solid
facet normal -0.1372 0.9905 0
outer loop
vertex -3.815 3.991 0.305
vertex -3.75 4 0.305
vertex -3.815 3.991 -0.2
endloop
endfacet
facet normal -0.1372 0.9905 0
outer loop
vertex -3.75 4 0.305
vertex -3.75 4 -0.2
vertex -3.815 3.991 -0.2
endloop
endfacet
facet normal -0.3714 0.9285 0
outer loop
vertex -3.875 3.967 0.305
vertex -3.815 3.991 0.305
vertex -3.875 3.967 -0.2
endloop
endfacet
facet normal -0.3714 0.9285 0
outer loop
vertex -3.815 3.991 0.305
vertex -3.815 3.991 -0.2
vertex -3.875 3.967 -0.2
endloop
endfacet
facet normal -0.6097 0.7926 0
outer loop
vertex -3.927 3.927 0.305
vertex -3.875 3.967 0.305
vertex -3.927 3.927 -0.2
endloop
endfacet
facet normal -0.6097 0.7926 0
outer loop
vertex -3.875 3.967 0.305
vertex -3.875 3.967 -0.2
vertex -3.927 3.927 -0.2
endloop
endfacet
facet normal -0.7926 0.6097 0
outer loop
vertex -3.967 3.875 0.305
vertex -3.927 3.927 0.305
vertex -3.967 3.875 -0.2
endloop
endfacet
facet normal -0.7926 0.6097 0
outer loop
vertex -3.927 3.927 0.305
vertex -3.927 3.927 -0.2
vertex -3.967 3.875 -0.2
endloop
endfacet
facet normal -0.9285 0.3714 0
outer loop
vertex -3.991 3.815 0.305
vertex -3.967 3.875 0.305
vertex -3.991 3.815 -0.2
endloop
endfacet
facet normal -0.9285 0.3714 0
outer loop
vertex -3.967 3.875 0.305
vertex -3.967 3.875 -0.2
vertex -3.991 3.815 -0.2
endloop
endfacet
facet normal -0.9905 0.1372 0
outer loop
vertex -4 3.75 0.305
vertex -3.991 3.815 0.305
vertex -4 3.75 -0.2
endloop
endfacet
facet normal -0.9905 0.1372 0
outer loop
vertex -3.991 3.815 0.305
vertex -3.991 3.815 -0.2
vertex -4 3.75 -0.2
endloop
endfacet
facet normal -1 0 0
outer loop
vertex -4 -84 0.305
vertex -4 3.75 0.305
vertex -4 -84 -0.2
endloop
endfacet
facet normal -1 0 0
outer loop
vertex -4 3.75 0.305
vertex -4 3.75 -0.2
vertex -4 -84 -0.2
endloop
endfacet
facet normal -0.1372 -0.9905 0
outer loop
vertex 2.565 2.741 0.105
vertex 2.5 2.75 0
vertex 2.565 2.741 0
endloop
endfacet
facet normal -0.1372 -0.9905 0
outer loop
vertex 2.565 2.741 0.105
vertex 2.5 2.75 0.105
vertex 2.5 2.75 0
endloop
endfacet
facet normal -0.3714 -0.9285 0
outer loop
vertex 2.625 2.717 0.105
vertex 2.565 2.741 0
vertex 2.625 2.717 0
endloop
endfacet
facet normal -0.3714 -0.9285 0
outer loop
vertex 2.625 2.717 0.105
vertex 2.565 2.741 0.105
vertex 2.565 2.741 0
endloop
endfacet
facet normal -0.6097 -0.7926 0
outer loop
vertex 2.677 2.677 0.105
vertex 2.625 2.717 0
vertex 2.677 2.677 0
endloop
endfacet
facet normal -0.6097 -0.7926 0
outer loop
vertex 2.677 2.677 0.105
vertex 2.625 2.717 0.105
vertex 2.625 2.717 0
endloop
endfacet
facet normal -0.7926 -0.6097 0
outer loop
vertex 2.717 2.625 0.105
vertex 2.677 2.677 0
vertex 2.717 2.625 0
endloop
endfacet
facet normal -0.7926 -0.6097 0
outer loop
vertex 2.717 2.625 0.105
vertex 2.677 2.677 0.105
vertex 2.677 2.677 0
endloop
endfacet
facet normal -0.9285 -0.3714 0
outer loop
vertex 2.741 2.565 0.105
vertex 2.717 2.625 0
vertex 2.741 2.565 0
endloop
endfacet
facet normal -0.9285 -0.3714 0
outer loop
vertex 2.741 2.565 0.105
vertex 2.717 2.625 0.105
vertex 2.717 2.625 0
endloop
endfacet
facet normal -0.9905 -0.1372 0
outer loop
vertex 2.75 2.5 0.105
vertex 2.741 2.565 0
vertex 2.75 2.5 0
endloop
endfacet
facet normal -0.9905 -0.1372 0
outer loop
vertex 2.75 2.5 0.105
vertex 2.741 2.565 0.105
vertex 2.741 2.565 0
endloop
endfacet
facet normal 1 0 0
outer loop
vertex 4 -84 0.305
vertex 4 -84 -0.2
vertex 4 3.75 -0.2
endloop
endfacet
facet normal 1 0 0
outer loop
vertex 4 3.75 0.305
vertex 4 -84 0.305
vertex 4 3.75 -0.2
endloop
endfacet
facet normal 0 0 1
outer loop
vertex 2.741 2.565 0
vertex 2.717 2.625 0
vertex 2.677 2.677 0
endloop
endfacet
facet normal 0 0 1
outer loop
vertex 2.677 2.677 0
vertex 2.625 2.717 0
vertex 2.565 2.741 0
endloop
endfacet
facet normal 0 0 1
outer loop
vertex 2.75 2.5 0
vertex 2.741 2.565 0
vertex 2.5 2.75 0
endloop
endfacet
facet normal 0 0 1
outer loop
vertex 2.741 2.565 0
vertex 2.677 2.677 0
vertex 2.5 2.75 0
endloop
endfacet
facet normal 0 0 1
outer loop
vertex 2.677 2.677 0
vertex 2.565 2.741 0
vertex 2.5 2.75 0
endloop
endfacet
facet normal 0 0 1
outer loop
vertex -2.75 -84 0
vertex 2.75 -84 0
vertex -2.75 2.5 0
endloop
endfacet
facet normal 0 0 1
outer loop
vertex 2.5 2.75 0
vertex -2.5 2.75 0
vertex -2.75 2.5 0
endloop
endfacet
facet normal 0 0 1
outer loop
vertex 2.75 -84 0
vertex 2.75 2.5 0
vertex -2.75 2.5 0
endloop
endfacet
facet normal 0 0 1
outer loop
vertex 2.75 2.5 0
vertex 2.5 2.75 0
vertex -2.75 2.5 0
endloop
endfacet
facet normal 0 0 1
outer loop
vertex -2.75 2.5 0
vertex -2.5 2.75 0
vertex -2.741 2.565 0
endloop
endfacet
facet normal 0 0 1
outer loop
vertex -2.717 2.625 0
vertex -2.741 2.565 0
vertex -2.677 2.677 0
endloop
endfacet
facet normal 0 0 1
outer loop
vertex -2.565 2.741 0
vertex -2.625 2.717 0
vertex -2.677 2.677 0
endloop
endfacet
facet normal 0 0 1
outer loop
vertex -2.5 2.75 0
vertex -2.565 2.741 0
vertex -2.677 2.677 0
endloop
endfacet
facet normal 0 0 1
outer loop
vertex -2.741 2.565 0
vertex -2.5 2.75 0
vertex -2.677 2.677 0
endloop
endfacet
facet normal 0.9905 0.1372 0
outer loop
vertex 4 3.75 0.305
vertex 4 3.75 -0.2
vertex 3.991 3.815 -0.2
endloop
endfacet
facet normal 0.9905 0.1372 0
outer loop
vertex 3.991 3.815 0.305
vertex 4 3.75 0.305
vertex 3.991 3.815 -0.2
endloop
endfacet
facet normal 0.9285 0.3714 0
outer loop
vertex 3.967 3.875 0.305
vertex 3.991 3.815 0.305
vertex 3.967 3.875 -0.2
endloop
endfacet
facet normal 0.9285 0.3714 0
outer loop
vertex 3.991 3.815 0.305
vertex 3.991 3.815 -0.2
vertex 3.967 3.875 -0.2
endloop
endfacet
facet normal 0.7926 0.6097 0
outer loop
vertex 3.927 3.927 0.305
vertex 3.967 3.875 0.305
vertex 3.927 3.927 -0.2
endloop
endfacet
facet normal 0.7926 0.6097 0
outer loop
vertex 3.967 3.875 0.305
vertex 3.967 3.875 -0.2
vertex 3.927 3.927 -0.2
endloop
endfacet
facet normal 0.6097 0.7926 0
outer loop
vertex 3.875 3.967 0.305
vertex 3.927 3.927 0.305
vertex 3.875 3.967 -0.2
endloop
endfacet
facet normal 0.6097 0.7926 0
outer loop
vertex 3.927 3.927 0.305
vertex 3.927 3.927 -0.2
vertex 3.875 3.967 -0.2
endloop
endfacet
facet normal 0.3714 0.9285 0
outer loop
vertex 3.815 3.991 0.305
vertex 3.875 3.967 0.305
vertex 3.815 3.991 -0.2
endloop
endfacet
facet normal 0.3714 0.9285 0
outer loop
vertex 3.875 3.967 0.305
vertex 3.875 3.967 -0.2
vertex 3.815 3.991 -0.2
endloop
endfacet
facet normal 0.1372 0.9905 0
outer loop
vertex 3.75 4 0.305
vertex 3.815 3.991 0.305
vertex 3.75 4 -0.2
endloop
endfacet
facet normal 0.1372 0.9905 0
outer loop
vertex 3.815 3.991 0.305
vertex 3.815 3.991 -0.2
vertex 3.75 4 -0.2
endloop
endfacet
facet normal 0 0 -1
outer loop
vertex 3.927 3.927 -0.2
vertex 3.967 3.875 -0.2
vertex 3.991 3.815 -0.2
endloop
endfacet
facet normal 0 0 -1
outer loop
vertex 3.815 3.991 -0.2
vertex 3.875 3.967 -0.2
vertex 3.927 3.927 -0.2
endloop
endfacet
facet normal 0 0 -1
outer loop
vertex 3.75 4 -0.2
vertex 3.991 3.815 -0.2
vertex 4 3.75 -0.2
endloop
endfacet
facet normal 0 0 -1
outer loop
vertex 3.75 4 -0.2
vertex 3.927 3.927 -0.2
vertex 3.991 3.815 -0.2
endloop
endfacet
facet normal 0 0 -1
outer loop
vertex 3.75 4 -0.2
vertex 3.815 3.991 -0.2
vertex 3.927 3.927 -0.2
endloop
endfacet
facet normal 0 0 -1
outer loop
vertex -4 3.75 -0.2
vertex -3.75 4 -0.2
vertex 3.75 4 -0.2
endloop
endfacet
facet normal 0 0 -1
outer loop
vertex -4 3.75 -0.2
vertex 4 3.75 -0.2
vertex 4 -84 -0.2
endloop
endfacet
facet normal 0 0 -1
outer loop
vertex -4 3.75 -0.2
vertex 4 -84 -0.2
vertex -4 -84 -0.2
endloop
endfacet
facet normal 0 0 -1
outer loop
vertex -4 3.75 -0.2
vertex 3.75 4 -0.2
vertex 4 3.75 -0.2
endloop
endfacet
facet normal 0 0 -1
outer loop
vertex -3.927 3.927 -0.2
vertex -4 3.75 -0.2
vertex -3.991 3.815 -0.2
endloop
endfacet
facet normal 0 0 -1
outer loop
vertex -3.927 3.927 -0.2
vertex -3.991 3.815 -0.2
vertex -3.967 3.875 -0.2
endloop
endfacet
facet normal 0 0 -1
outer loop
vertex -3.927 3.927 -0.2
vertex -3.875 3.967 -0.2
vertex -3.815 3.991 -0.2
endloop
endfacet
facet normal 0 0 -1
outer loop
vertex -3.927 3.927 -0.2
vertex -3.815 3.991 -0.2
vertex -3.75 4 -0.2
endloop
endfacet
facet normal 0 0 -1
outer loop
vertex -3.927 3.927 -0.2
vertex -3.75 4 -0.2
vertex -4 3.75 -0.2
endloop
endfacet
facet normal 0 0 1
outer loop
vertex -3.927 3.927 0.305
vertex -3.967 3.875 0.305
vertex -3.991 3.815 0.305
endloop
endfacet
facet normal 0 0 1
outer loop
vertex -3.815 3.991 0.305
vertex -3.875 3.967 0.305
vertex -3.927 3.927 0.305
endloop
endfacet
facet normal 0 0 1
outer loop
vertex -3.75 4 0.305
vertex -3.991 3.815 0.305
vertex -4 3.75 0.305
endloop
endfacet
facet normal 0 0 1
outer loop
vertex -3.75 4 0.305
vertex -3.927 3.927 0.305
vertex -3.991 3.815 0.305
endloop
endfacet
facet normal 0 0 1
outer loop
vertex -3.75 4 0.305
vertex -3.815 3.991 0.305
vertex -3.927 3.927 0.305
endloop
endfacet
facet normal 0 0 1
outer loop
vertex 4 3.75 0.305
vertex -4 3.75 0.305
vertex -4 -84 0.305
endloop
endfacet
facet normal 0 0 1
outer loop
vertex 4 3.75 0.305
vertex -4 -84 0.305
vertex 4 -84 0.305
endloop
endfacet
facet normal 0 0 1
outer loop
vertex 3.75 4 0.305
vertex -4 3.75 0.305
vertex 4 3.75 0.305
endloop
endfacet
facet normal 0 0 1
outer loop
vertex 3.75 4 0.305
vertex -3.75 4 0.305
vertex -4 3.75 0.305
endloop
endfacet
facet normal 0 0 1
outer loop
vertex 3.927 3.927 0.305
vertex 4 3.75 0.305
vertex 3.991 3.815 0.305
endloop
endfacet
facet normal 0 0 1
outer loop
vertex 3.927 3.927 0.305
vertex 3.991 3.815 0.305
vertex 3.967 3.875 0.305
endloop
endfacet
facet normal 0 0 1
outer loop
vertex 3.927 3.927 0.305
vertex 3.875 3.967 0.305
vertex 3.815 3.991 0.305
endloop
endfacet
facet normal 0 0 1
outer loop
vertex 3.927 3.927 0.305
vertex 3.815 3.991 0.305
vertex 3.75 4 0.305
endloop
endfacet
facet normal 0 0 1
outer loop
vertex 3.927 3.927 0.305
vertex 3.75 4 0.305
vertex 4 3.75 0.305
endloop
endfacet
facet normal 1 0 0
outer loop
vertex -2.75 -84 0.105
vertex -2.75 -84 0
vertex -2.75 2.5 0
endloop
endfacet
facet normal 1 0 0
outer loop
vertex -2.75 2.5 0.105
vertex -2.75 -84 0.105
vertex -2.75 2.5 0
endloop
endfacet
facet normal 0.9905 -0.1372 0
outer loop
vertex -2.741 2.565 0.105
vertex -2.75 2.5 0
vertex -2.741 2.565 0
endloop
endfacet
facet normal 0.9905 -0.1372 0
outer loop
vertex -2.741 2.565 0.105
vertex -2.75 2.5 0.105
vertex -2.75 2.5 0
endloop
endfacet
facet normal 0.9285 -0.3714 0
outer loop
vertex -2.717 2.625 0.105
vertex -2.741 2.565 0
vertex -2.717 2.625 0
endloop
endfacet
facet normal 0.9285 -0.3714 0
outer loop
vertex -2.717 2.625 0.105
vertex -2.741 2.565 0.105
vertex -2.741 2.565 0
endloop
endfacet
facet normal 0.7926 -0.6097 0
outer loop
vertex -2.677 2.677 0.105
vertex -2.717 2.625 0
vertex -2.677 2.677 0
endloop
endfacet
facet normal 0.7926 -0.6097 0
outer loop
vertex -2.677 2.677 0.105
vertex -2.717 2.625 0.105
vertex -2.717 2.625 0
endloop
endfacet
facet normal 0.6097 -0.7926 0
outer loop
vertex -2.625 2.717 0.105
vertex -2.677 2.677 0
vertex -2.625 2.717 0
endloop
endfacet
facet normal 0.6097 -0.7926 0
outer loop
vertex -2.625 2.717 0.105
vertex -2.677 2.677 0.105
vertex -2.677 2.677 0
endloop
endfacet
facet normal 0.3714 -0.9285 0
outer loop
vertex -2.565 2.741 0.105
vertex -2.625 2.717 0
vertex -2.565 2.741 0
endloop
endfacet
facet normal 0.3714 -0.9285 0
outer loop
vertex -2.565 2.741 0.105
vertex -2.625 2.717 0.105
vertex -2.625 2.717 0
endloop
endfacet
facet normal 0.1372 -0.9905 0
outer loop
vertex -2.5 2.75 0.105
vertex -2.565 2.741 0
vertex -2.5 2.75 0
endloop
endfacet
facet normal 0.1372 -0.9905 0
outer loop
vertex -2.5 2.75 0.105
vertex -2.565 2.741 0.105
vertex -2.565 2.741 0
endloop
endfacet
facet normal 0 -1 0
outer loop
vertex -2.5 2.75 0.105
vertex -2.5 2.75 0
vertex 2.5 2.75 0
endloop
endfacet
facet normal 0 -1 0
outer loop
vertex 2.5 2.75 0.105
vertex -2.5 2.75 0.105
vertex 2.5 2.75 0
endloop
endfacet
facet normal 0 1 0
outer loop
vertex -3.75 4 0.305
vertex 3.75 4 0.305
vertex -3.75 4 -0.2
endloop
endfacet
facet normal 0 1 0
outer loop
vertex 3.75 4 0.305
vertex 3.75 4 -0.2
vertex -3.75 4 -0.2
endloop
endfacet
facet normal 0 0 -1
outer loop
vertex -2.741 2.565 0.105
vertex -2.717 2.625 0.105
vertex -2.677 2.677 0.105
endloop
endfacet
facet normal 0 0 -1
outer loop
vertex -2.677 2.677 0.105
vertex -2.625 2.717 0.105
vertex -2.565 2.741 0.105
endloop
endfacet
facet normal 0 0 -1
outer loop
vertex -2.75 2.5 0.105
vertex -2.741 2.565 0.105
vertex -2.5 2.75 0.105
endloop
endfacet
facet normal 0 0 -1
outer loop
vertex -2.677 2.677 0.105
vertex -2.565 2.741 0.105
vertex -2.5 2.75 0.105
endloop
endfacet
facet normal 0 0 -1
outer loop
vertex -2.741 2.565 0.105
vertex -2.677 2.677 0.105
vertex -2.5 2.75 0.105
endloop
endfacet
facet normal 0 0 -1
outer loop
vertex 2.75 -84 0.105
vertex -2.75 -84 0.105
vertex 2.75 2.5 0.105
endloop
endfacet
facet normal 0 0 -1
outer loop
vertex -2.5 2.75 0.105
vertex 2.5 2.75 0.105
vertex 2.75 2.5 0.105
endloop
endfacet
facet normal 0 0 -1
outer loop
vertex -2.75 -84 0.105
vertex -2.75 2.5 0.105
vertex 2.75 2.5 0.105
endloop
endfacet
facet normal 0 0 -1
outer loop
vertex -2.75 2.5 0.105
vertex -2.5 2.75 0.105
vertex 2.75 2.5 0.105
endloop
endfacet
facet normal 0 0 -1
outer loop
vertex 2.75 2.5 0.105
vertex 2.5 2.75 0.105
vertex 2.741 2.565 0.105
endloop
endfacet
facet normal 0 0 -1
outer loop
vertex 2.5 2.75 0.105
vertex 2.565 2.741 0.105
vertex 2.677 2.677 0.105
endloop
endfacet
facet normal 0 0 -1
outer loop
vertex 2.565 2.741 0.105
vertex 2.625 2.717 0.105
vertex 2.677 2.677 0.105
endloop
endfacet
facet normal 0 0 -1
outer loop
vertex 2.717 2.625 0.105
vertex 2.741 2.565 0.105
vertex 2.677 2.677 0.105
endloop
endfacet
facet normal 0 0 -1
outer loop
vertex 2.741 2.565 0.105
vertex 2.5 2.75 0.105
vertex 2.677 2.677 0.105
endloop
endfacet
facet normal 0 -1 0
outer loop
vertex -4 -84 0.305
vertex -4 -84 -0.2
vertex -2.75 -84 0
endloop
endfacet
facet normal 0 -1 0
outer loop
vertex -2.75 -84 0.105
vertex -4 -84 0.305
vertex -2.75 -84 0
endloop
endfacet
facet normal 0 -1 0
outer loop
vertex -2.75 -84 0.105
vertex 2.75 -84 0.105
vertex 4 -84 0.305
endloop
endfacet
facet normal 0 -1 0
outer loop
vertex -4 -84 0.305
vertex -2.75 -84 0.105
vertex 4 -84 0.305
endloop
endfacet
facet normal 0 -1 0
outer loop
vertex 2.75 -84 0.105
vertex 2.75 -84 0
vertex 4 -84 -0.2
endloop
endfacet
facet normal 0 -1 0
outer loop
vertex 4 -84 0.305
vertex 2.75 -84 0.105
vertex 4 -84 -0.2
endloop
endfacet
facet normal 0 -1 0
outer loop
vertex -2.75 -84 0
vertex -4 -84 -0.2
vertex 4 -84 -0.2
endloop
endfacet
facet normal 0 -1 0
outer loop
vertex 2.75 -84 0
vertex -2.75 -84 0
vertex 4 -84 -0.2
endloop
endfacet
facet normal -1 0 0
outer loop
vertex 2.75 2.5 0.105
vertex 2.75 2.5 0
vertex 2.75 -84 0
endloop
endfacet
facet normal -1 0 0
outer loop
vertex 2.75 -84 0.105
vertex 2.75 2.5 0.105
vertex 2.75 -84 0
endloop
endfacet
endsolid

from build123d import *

# Parameters (mm, degrees)
SKETCH1_W           = 1.25
SKETCH1_H           = 80
BOSS_EXTRUDE1_DEPTH = 0.105
FILLET1_R           = 0.25
BOSS_EXTRUDE2_DEPTH = 0.2
BOSS_EXTRUDE3_DEPTH = 0.2


with BuildPart() as part:
    # Sketch1 → Boss-Extrude1 (new body)
    with BuildSketch(Plane.XY):
        with Locations((3.375, -44)):
            Rectangle(SKETCH1_W, SKETCH1_H)
        Polygon((-2.75, -4), (-2.75, -2.75), (-2.75, 2.75), (2.75, 2.75), (2.75, -2.75), (2.75, -4), (4, -4), (4, 4), (-4, 4), (-4, -4), align=None)
        with Locations((-3.375, -44)):
            Rectangle(SKETCH1_W, SKETCH1_H)
    extrude(amount=BOSS_EXTRUDE1_DEPTH)

    # Fillet1
    fillet1_edges = [part.edges().sort_by_distance(p)[0] for p in [
        (2.75, 2.75, 0.0525),
        (-2.75, 2.75, 0.0525),
        (-4, 4, 0.0525),
        (4, 4, 0.0525),
    ]]
    fillet(fillet1_edges, radius=FILLET1_R)

    # Sketch2 → Boss-Extrude2 (add)
    with BuildSketch(Plane(origin=(0, 0, 0), x_dir=(-1, 0, 0), z_dir=(0, 0, -1))):
        with BuildLine():
            Line((2.75, -84), (4, -84))
            Line((4, -84), (4, 3.75))
            ThreePointArc((4, 3.75), (3.926776695, 3.926776695), (3.75, 4))
            Line((3.75, 4), (-3.75, 4))
            ThreePointArc((-3.75, 4), (-3.926776695, 3.926776695), (-4, 3.75))
            Line((-4, 3.75), (-4, -84))
            Line((-4, -84), (-2.75, -84))
            Line((-2.75, -84), (-2.75, 2.5))
            ThreePointArc((-2.75, 2.5), (-2.676776695, 2.676776695), (-2.5, 2.75))
            Line((-2.5, 2.75), (2.5, 2.75))
            ThreePointArc((2.5, 2.75), (2.676776695, 2.676776695), (2.75, 2.5))
            Line((2.75, 2.5), (2.75, -84))
        make_face()
        with BuildLine():
            Line((-2.75, -84), (2.75, -84))
            Line((2.75, -84), (2.75, 2.5))
            ThreePointArc((2.75, 2.5), (2.676776695, 2.676776695), (2.5, 2.75))
            Line((2.5, 2.75), (-2.5, 2.75))
            ThreePointArc((-2.5, 2.75), (-2.676776695, 2.676776695), (-2.75, 2.5))
            Line((-2.75, 2.5), (-2.75, -84))
        make_face()
    extrude(amount=BOSS_EXTRUDE2_DEPTH)

    # Sketch4 → Boss-Extrude3 (add)
    with BuildSketch(Plane.XY.offset(0.105)):
        with BuildLine():
            ThreePointArc((4, 3.75), (3.926776695, 3.926776695), (3.75, 4))
            Line((3.75, 4), (-3.75, 4))
            ThreePointArc((-3.75, 4), (-3.926776695, 3.926776695), (-4, 3.75))
            Line((-4, 3.75), (-4, -84))
            Line((-4, -84), (-2.75, -84))
            Line((-2.75, -84), (-2.75, 2.5))
            ThreePointArc((-2.75, 2.5), (-2.676776695, 2.676776695), (-2.5, 2.75))
            Line((-2.5, 2.75), (2.5, 2.75))
            ThreePointArc((2.5, 2.75), (2.676776695, 2.676776695), (2.75, 2.5))
            Line((2.75, 2.5), (2.75, -84))
            Line((2.75, -84), (4, -84))
            Line((4, -84), (4, 3.75))
        make_face()
        with BuildLine():
            Line((-2.75, -84), (2.75, -84))
            Line((2.75, -84), (2.75, 2.5))
            ThreePointArc((2.75, 2.5), (2.676776695, 2.676776695), (2.5, 2.75))
            Line((2.5, 2.75), (-2.5, 2.75))
            ThreePointArc((-2.5, 2.75), (-2.676776695, 2.676776695), (-2.75, 2.5))
            Line((-2.75, 2.5), (-2.75, -84))
        make_face()
    extrude(amount=BOSS_EXTRUDE3_DEPTH)


solid = part.part
